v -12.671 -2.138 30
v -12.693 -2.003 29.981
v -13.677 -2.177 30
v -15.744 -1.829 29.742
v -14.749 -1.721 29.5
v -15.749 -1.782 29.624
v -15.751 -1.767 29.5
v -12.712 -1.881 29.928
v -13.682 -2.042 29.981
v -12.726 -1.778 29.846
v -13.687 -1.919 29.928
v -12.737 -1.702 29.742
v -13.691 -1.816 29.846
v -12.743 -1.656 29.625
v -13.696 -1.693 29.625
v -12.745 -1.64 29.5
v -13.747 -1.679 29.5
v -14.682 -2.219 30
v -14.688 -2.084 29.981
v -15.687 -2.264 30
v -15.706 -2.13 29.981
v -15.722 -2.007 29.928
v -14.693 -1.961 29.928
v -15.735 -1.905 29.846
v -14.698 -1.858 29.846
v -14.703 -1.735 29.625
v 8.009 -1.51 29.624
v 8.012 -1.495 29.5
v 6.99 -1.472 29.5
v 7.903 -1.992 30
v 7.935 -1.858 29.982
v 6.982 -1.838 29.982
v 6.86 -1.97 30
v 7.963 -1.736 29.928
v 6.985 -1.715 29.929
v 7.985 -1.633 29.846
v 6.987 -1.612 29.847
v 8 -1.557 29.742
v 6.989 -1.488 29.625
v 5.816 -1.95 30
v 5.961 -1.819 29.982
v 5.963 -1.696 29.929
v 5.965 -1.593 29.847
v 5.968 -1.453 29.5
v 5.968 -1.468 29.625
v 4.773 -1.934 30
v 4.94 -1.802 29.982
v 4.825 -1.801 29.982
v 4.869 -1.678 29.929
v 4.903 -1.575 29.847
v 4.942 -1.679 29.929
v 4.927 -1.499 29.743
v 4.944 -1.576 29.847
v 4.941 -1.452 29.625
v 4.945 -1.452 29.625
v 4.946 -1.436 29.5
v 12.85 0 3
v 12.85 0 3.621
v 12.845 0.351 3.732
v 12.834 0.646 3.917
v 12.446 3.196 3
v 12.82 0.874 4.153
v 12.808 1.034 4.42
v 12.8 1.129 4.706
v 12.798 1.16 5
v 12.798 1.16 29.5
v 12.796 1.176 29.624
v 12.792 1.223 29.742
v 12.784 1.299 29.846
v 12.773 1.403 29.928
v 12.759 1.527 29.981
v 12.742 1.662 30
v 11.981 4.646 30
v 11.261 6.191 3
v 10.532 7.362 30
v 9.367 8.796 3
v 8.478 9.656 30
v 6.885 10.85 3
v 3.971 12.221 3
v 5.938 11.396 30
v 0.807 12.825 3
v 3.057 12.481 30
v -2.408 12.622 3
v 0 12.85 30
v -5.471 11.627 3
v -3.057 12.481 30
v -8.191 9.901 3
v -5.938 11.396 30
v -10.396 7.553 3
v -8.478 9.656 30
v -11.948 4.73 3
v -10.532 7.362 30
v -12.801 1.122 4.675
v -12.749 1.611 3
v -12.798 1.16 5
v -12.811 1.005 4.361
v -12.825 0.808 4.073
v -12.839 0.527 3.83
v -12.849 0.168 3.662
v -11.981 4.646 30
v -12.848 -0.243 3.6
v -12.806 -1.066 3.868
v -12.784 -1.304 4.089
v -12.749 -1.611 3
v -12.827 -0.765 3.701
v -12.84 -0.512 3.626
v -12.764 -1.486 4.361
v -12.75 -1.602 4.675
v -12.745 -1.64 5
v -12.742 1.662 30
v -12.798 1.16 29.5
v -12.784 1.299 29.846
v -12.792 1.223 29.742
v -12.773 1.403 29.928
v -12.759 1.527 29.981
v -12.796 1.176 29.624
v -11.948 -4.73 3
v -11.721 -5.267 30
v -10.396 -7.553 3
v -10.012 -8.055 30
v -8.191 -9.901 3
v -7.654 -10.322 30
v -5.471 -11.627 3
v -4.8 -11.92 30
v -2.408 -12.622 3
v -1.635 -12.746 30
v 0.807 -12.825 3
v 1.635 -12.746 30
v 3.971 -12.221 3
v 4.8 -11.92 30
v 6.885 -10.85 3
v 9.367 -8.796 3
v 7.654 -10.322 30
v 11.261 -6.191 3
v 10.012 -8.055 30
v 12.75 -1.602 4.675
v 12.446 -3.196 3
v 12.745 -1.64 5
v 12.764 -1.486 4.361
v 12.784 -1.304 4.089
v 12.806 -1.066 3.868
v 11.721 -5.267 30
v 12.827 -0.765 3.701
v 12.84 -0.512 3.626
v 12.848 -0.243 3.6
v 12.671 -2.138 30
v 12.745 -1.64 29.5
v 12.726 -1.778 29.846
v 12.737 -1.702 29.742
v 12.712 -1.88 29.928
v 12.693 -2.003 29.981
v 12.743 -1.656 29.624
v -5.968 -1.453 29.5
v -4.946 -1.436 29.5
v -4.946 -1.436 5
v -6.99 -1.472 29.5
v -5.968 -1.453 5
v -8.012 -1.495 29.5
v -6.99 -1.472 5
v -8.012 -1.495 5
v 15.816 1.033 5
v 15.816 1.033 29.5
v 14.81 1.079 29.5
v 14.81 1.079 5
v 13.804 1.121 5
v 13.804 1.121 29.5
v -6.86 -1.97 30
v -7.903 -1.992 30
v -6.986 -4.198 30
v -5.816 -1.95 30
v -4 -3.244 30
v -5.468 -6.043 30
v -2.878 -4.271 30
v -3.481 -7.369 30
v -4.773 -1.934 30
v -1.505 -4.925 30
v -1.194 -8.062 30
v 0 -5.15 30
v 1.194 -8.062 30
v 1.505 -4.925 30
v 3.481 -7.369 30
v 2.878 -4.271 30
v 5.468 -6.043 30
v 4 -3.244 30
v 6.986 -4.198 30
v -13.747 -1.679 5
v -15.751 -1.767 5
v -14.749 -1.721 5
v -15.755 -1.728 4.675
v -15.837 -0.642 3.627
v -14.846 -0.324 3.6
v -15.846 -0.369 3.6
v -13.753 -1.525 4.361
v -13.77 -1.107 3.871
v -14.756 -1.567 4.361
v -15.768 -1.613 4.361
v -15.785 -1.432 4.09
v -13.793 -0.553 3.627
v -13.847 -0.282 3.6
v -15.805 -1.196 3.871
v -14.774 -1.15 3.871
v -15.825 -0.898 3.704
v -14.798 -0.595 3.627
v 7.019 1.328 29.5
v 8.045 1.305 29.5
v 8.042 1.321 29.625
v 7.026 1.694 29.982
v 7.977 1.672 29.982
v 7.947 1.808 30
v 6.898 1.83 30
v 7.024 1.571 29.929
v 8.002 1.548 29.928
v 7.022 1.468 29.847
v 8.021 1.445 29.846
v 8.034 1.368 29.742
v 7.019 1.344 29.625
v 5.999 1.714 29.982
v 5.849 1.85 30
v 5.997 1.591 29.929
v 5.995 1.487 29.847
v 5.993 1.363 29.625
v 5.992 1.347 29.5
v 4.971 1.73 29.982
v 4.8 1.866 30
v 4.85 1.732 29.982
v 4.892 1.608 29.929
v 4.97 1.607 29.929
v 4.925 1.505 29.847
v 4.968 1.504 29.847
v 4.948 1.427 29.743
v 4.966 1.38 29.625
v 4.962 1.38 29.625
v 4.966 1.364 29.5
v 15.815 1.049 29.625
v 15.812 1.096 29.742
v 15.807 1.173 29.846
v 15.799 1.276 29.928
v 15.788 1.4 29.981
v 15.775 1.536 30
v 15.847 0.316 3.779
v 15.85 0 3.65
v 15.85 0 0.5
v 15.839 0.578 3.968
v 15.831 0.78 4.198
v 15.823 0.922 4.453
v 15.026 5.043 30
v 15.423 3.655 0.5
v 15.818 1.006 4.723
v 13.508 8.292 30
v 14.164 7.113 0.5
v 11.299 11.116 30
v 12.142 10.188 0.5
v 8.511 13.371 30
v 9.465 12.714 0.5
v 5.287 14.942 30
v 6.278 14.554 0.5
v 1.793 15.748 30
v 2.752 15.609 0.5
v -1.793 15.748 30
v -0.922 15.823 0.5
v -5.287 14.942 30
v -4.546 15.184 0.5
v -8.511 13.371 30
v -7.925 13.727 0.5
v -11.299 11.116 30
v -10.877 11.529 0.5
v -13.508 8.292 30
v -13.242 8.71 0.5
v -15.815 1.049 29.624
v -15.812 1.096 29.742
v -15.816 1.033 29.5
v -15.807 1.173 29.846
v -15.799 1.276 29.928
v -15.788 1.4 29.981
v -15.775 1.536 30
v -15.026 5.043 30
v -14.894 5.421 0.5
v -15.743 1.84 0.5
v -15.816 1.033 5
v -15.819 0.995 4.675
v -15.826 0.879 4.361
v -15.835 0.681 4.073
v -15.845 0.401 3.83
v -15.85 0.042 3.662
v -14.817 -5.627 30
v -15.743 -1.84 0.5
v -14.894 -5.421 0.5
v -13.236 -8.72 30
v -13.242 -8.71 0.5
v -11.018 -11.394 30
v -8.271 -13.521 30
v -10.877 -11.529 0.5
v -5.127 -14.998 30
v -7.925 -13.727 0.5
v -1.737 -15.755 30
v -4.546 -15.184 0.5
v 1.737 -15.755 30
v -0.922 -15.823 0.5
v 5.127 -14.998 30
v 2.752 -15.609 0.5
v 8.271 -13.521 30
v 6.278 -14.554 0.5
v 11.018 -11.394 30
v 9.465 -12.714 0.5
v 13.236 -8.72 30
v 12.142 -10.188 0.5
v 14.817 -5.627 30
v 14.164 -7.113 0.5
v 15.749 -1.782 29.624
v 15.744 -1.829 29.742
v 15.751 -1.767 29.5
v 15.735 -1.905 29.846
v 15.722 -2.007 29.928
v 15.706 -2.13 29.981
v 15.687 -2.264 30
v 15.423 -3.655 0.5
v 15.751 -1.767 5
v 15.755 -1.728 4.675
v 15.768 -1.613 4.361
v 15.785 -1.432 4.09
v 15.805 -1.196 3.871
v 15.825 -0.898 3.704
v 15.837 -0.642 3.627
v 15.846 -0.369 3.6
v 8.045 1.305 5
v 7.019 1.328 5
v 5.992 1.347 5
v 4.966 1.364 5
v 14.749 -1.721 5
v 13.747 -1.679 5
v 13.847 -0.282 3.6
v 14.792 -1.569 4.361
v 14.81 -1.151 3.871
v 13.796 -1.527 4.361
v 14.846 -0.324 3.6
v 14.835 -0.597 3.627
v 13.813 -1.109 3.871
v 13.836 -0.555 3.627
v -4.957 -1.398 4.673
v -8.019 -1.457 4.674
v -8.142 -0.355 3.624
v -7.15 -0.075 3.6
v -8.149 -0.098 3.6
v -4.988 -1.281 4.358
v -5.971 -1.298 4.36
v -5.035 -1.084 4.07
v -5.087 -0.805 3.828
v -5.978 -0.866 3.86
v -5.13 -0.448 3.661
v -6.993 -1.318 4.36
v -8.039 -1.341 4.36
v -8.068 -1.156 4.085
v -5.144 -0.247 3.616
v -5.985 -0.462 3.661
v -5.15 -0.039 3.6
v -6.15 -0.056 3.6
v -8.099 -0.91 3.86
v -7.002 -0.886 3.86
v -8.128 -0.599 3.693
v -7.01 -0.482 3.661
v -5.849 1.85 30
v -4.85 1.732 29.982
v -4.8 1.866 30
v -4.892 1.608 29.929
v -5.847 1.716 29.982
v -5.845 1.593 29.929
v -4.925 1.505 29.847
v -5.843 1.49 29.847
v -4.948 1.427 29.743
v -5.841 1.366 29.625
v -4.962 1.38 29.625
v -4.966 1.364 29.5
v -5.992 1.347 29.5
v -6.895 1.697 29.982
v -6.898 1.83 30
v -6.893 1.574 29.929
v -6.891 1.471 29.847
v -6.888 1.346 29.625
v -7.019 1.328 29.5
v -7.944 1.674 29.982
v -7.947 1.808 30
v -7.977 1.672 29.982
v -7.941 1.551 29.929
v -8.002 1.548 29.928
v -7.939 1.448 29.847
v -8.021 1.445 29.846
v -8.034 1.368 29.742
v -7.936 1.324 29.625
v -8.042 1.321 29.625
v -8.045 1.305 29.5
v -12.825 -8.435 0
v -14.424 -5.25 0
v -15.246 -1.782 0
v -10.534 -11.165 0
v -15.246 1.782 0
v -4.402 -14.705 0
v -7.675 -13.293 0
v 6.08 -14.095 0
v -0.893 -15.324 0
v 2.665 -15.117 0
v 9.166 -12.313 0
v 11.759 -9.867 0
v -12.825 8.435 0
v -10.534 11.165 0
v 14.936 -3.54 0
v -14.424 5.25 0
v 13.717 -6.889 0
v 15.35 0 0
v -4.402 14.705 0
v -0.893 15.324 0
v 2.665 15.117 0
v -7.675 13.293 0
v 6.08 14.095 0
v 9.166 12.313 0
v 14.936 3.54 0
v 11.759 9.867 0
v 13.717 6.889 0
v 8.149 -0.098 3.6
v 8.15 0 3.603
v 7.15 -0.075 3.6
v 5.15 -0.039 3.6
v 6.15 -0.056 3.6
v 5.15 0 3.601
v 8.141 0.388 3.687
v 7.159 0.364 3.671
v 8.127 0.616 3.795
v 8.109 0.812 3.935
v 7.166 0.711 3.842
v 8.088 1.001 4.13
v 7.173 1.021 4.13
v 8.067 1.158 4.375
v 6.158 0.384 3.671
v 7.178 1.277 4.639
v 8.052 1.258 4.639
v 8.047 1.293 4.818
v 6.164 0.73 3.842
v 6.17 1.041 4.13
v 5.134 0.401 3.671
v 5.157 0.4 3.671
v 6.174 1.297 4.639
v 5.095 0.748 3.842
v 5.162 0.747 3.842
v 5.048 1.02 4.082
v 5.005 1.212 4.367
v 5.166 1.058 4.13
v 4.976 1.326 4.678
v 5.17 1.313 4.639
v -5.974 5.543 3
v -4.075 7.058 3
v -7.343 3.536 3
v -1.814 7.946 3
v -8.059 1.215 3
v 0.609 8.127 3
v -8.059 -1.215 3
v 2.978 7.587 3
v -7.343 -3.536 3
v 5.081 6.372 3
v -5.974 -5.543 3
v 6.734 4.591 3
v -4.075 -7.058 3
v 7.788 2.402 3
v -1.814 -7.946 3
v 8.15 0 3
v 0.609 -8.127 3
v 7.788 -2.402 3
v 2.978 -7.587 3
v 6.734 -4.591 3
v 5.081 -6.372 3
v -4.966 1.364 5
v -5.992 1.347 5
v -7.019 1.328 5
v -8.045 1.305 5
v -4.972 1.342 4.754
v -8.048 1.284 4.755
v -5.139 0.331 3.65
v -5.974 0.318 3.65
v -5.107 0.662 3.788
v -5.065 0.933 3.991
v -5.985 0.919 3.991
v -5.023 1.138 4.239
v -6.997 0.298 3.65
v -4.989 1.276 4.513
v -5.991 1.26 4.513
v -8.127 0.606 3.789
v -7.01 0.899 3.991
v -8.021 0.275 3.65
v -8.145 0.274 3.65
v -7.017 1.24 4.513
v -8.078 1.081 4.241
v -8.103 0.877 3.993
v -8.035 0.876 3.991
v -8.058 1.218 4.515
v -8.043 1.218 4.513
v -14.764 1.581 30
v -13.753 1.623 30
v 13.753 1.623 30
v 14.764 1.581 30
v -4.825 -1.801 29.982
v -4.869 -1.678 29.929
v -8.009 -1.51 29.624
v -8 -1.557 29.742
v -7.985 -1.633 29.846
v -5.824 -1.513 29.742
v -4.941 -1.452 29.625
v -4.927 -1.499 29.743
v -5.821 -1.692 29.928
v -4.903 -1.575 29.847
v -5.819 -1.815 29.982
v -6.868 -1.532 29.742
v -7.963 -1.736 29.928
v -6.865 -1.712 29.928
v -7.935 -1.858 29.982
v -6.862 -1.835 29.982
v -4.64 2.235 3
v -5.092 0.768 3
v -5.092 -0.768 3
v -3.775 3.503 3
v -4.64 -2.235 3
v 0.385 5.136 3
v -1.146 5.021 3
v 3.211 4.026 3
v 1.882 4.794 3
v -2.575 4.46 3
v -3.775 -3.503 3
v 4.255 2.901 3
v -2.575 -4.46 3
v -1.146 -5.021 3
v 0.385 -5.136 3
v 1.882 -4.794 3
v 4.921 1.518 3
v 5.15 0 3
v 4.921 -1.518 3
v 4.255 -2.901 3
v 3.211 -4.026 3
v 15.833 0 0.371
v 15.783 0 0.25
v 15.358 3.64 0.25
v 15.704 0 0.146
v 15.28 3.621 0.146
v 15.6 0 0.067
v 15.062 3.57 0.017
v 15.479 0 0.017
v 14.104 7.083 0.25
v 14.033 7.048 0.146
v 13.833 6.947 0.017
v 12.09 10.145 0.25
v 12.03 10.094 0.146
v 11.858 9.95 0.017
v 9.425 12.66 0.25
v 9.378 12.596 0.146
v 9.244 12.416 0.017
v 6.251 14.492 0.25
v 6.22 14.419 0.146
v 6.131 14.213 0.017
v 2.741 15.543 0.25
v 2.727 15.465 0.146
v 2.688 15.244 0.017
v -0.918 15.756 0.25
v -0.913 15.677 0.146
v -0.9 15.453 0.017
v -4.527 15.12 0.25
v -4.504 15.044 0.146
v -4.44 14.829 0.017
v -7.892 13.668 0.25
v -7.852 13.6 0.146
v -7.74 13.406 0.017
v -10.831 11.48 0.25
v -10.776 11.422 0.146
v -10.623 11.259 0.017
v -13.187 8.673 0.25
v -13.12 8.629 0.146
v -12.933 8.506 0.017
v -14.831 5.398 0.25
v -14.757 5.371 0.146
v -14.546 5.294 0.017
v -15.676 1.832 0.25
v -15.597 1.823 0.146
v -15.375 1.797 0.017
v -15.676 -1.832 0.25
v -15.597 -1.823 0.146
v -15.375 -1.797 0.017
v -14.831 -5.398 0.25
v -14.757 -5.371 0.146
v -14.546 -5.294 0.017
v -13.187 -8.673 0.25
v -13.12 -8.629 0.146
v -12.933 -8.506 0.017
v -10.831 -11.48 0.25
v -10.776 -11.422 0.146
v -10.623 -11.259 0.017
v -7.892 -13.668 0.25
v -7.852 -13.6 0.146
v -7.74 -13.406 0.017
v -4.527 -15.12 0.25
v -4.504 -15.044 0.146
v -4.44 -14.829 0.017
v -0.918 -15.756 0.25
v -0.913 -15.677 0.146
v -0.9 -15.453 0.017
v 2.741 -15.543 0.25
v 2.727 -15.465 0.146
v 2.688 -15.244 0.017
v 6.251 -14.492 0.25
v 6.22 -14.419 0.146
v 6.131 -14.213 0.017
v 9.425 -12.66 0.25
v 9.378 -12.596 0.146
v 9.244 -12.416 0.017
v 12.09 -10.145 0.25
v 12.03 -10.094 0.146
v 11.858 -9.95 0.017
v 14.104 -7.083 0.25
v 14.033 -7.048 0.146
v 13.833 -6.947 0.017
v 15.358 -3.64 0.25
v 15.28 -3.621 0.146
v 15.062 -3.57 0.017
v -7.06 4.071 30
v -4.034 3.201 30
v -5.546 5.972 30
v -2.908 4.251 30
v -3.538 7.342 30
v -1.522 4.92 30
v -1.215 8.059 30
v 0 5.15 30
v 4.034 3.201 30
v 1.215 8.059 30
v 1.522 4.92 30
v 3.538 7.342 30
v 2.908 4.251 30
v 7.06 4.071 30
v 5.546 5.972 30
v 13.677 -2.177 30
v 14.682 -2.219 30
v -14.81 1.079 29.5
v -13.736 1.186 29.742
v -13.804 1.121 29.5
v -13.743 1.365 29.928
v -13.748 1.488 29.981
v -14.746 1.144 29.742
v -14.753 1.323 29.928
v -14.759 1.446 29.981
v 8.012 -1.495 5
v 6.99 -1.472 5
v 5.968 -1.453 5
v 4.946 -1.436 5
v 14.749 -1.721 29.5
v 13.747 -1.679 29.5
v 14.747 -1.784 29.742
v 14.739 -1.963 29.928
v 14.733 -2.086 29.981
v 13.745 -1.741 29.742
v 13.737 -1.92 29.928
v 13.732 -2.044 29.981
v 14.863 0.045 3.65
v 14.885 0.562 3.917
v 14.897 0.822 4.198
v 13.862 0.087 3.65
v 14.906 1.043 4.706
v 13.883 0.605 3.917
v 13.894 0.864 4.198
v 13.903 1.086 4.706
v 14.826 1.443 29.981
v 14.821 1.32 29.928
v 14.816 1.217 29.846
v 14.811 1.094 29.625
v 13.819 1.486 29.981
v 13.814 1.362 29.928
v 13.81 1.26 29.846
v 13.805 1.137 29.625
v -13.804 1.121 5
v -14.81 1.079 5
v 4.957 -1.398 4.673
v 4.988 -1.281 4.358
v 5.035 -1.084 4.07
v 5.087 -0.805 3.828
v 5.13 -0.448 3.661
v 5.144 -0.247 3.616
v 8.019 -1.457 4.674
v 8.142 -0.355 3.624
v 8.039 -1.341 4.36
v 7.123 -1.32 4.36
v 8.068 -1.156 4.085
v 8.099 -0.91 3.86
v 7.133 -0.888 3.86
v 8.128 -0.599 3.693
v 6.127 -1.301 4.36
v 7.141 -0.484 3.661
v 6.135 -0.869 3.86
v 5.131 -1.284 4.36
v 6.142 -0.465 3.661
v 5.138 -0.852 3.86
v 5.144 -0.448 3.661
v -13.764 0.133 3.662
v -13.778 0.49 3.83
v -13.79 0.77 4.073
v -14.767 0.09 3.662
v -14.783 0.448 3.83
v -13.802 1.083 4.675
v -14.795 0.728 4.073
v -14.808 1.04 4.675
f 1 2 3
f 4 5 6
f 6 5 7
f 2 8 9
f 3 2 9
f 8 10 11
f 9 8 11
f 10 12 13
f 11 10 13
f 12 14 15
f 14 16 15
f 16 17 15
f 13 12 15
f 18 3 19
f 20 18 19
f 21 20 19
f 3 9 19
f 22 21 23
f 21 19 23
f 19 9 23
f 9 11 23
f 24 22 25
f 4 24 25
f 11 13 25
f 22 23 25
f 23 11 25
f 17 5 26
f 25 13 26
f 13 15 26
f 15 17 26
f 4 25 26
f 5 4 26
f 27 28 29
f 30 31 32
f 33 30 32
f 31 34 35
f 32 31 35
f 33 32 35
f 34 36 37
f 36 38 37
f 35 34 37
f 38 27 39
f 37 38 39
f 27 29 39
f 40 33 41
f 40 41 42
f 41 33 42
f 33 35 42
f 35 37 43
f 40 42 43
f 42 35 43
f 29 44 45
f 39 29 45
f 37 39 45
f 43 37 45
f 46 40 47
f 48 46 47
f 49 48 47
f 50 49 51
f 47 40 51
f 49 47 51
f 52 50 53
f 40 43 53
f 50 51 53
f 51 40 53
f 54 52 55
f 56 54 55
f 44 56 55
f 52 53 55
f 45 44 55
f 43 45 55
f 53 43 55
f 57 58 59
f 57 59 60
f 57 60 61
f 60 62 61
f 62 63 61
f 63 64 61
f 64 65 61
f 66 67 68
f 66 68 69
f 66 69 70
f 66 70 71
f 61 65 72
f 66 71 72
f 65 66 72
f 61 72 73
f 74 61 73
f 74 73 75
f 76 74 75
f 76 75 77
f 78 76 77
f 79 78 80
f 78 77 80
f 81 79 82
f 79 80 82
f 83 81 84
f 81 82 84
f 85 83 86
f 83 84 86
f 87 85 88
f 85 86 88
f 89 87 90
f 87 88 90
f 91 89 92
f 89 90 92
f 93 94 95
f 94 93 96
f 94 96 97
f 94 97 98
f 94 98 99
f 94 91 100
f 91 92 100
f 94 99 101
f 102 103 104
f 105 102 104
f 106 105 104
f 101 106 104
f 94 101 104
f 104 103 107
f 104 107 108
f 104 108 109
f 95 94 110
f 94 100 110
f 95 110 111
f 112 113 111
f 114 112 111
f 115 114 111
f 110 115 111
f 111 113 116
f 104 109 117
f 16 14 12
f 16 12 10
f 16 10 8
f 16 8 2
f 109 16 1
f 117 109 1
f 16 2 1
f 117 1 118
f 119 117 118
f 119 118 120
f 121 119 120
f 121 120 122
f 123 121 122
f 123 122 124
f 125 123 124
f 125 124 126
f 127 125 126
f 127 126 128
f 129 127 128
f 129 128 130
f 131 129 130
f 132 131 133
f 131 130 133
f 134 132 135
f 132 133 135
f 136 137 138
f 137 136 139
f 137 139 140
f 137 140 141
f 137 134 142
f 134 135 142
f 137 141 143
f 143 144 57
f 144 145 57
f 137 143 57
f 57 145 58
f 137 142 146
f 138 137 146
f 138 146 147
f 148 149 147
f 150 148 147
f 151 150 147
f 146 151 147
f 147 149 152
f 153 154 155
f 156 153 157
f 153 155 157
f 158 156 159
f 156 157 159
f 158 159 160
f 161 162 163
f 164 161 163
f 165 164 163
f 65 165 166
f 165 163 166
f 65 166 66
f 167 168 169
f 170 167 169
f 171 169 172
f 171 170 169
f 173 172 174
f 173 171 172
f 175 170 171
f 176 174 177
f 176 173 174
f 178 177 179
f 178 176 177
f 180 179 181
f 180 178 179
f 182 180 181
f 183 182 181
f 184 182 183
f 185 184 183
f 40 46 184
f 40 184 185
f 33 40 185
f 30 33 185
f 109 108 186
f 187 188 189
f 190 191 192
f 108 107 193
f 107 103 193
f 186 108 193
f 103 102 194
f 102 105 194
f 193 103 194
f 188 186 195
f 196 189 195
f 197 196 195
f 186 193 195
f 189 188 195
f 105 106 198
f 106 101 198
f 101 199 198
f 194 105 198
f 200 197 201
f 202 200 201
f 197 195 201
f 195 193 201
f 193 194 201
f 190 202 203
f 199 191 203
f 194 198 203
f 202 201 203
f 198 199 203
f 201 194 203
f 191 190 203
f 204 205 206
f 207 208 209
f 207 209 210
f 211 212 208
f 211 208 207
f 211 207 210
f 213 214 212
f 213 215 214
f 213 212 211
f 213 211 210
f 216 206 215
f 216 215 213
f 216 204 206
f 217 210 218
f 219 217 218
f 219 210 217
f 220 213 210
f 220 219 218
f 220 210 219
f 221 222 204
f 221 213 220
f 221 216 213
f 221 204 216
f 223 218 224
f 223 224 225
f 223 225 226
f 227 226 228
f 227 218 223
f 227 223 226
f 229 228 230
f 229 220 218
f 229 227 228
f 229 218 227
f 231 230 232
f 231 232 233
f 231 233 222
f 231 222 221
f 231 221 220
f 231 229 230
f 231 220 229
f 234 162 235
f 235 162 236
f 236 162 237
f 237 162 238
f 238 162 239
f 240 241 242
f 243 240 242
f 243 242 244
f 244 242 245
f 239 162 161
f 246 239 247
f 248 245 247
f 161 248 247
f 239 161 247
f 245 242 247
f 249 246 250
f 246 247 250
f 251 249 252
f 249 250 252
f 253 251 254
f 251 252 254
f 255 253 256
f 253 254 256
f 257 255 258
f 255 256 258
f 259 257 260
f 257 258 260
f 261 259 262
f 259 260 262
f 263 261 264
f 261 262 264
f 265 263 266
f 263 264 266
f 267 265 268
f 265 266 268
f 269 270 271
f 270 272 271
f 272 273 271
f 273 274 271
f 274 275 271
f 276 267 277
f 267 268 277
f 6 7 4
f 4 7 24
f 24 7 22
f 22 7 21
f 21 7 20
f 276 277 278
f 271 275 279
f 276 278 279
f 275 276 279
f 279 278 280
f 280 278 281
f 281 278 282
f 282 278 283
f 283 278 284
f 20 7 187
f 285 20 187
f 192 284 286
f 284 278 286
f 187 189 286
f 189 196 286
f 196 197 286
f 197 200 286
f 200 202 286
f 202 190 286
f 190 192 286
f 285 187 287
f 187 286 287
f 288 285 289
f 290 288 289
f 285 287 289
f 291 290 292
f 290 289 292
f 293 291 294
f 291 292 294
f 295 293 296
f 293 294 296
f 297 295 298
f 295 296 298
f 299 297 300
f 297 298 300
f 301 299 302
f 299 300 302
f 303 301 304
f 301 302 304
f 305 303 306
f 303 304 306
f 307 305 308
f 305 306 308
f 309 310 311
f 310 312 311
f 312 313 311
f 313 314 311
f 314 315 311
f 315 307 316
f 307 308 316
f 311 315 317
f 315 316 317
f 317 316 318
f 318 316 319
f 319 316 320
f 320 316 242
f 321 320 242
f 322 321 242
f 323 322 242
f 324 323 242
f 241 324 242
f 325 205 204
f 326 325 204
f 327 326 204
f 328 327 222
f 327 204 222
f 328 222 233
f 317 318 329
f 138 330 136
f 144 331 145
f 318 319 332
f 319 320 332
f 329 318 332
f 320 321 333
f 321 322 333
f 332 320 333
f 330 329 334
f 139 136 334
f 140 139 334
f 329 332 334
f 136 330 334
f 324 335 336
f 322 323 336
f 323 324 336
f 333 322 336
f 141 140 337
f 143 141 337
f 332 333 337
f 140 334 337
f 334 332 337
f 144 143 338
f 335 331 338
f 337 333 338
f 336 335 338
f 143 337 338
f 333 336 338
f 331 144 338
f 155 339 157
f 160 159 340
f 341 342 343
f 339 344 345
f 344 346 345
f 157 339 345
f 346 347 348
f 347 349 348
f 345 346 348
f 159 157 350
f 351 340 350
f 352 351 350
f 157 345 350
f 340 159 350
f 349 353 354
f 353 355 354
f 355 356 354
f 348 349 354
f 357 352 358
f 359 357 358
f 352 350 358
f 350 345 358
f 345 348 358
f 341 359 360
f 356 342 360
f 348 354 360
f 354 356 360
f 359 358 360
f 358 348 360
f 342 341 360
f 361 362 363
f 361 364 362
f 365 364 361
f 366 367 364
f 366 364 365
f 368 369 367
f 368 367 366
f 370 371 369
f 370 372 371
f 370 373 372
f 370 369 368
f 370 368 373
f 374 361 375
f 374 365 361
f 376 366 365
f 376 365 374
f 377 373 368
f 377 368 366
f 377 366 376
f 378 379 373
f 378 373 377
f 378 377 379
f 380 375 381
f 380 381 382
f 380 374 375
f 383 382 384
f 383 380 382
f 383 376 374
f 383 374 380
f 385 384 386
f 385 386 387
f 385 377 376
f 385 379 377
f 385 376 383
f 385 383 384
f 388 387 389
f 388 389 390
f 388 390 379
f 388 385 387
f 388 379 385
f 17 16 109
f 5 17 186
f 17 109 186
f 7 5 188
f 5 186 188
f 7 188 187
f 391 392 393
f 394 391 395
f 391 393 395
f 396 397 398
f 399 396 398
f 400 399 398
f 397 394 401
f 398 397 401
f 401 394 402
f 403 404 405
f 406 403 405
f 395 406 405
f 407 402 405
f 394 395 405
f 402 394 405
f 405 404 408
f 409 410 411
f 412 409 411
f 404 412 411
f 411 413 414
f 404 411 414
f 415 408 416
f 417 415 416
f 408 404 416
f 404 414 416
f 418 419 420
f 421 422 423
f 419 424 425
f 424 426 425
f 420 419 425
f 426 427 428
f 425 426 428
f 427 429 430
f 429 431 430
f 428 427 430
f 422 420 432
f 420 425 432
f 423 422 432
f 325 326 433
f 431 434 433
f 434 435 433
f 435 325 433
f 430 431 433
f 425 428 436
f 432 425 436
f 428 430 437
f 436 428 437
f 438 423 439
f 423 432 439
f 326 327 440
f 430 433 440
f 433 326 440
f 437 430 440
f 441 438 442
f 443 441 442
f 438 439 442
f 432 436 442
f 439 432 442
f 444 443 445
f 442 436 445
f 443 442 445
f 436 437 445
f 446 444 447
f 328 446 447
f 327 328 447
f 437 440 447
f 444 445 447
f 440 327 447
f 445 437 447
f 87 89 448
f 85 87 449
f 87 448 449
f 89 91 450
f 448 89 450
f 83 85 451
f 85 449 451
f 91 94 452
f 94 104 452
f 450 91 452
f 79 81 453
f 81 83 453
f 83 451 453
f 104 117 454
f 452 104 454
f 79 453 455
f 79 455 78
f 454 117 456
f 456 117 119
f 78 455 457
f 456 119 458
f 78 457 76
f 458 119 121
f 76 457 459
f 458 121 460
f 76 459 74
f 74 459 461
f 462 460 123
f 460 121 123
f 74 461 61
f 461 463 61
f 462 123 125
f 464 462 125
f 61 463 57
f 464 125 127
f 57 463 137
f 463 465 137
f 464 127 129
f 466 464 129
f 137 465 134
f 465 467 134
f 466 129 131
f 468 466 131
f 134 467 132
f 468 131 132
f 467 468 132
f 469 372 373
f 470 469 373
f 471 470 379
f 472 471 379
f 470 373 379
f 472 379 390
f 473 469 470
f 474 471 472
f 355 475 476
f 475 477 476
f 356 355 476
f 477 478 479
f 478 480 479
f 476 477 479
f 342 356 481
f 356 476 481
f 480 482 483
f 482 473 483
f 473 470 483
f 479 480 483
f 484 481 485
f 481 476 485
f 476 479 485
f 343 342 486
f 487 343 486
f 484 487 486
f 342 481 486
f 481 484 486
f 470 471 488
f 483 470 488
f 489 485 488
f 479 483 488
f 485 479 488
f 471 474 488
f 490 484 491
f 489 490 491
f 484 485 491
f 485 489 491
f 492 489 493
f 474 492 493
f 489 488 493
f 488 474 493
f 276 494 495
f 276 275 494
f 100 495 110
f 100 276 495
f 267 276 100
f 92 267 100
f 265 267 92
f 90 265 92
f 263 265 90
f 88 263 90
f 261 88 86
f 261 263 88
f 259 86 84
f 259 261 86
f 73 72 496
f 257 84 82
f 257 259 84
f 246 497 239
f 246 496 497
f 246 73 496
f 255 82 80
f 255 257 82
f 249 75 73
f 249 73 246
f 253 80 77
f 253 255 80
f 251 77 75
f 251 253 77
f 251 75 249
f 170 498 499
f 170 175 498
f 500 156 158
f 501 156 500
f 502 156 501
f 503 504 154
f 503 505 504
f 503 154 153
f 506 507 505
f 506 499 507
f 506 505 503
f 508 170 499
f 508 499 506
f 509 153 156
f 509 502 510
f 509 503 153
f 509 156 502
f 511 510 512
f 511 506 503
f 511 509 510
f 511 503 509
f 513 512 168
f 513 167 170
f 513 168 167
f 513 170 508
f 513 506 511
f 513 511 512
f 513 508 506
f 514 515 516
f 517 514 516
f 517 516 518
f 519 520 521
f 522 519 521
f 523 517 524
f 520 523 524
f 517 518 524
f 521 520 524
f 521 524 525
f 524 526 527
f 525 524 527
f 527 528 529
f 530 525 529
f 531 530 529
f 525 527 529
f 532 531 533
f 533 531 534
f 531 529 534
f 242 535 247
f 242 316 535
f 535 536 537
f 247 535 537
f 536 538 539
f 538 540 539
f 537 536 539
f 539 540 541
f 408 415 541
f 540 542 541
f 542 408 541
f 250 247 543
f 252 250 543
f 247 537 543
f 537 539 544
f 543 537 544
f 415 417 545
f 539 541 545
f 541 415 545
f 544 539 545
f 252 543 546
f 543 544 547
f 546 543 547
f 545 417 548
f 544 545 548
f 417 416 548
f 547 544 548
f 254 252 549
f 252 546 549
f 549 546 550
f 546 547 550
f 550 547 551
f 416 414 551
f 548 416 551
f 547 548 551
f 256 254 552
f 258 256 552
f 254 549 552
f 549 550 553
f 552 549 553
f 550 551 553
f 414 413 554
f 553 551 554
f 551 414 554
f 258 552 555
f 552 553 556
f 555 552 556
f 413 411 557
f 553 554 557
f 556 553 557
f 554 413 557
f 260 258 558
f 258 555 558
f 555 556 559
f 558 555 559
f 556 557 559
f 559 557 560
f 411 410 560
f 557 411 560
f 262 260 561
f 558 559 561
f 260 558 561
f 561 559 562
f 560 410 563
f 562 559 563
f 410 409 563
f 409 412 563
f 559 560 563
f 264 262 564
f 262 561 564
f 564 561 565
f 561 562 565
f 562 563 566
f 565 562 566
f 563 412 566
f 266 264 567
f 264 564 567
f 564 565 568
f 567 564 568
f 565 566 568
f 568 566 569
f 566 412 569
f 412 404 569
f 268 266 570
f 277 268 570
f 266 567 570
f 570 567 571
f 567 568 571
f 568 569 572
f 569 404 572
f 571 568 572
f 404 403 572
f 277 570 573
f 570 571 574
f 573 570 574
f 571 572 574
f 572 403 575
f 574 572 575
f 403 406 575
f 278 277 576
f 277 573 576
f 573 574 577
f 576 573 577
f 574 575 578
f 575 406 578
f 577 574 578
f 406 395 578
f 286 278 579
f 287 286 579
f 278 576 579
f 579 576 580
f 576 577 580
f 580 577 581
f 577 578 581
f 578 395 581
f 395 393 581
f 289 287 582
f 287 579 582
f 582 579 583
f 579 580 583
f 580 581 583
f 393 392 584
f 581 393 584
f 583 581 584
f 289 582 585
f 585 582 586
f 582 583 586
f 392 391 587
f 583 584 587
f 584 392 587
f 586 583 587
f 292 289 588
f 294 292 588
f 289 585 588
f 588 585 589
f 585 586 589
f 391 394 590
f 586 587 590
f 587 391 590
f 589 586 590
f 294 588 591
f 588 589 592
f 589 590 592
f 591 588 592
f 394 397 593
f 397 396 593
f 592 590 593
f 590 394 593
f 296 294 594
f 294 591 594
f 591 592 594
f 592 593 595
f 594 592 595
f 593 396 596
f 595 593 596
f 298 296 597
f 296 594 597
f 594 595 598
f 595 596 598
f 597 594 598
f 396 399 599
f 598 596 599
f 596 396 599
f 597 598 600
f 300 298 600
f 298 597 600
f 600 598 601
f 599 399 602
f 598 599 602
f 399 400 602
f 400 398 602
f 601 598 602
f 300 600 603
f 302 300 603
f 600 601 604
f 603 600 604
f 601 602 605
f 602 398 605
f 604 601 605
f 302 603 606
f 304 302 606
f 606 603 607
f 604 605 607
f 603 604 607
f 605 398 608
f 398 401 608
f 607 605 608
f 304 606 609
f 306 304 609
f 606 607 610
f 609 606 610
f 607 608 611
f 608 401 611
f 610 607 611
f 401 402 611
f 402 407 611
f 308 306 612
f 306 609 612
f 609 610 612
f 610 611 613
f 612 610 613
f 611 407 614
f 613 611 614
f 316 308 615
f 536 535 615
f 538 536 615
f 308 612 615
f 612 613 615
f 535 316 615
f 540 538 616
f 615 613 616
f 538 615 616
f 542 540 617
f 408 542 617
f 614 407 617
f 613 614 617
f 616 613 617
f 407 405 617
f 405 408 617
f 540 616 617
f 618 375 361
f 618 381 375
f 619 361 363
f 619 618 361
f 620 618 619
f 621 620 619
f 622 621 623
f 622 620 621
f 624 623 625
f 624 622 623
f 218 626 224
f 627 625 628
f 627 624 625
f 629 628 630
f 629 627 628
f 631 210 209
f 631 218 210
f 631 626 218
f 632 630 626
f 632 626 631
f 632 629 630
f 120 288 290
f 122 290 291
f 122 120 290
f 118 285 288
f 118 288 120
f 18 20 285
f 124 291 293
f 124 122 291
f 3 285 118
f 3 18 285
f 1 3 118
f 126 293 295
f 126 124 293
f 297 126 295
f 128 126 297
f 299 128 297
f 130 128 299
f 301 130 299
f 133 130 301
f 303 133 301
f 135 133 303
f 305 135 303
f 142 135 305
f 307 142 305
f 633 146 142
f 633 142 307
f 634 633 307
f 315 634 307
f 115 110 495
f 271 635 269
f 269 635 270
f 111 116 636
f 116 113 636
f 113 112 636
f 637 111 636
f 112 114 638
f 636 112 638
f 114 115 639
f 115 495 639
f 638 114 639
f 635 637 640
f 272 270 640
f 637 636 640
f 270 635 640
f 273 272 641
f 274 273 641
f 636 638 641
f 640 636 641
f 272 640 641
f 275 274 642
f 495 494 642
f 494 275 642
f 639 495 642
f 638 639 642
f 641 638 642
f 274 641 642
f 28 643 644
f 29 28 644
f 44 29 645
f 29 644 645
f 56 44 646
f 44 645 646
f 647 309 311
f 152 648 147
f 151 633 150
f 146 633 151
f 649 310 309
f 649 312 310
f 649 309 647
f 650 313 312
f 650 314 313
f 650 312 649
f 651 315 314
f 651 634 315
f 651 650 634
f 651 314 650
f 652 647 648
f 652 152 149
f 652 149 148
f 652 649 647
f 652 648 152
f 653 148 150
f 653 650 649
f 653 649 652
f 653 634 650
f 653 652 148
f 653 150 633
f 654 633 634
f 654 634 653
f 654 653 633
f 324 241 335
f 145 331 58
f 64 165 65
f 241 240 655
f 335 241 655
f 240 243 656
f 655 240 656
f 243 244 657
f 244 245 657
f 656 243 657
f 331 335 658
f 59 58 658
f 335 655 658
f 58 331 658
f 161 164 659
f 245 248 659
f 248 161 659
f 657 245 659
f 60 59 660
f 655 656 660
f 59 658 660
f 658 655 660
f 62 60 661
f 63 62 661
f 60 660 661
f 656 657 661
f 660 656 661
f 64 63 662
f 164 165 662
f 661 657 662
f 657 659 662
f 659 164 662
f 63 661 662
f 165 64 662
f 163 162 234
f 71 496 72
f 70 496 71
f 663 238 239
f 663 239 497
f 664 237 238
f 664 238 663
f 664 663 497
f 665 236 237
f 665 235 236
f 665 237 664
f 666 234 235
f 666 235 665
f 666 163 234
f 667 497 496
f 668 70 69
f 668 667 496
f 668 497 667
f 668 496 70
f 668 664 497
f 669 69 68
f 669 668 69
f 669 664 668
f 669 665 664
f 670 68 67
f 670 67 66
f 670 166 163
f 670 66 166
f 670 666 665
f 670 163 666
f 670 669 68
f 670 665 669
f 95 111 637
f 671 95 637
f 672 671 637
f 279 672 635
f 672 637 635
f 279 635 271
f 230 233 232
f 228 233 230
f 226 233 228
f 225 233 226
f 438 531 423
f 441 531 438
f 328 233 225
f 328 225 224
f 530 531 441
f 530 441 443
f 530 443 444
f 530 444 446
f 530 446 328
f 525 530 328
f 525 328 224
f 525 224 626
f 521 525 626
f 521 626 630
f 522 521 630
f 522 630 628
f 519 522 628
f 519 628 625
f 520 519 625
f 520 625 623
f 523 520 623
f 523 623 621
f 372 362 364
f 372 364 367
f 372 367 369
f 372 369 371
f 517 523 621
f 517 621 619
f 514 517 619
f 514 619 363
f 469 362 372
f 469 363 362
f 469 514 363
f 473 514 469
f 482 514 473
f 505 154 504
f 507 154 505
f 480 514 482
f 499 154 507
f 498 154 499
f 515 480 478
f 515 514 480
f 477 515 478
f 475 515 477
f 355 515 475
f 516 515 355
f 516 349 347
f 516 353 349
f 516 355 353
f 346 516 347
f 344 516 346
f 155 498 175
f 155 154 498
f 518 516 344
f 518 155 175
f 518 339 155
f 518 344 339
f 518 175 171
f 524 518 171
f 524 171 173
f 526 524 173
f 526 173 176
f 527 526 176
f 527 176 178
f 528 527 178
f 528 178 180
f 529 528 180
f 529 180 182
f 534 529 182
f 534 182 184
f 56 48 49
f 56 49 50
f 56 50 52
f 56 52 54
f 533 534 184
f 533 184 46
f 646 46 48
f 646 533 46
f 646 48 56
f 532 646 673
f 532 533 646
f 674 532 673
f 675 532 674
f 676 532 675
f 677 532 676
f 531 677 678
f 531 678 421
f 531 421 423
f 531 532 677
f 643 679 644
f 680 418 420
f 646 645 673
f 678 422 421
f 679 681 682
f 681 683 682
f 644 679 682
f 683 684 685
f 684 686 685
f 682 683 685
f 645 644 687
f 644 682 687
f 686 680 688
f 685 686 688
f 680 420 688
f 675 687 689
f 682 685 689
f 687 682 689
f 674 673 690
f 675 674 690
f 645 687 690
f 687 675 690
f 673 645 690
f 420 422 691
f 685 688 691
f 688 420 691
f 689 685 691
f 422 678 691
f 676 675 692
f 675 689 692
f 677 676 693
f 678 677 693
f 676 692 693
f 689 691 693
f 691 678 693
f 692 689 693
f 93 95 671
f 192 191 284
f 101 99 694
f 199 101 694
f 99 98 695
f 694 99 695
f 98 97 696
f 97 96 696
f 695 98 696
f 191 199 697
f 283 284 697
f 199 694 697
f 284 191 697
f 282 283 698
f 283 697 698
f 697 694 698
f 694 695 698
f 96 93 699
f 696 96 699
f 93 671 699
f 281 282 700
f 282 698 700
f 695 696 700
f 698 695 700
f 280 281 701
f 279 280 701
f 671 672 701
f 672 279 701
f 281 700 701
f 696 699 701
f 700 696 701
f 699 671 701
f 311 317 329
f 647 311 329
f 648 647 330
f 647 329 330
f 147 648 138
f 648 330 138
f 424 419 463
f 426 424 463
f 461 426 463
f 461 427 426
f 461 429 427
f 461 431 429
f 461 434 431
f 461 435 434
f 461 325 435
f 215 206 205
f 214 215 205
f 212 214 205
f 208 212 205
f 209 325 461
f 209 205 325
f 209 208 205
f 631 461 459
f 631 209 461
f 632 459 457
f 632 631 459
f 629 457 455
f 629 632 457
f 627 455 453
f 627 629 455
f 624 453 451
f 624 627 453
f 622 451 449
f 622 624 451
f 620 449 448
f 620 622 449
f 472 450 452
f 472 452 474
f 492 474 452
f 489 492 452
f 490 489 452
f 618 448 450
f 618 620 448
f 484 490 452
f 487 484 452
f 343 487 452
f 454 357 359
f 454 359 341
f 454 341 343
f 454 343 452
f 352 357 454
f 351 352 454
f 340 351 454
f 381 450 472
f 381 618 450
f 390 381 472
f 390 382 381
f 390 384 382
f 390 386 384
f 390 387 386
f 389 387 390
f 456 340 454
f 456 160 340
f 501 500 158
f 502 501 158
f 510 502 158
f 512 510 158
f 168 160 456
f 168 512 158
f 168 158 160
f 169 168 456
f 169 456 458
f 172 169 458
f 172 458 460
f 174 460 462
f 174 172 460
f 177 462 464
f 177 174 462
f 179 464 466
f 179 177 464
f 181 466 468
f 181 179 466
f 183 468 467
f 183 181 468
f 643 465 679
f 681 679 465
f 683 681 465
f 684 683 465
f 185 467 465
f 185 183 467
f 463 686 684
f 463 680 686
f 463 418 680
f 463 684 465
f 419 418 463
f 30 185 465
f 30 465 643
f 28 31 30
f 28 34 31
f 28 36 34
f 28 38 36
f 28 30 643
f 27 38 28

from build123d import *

# Parameters (mm, degrees)
F0_R      = 15.85
F0_R_2    = 5.15
F1_DEPTH  = 30
F2_R      = 12.85
F2_R_2    = 8.15
F3_DEPTH  = 40
F4_R      = 12.65
F4_R_2    = 8.9
F5_DEPTH  = 40
F10_R     = 0.5
F11_R     = 15.35
F12_DEPTH = 3


# Not quite as in the source:
# - a feature names something its author has since deleted; it is built from what else it names


with BuildPart() as f1:
    # F0 (on Top) → F1 (new body)
    with BuildSketch(Plane.XY):
        Circle(F0_R)
        Circle(F0_R_2, mode=Mode.SUBTRACT)
    extrude(amount=F1_DEPTH)

    # F2 (on face) → F3 (cut)
    with BuildSketch(Plane.XY.offset(30)):
        Circle(F2_R)
        Circle(F2_R_2, mode=Mode.SUBTRACT)
    extrude(amount=-F3_DEPTH, mode=Mode.SUBTRACT)

    # F4 (on face) → F5 (cut)
    with BuildSketch(Plane(origin=(0, 0, 0), x_dir=(1, 0, 0), z_dir=(0, 0, -1))):
        Circle(F4_R)
        Circle(F4_R_2, mode=Mode.SUBTRACT)
    extrude(amount=-F5_DEPTH, mode=Mode.SUBTRACT)

    # F7 (on Right) → F9 (revolve, cut)
    with BuildSketch(Plane.YZ):
        with BuildLine():
            Line((1.4, 5), (1.4, 30))
            Line((1.4, 30), (0, 30))
            Line((0, 30), (-1.4, 30))
            Line((-1.4, 30), (-1.4, 5))
            ThreePointArc((-1.4, 5), (-0.9899494937, 4.0100505063), (0, 3.6))
            ThreePointArc((0, 3.6), (0.9899494937, 4.0100505063), (1.4, 5))
        make_face()
    revolve(axis=Axis((0, -340, 29.7196172178), (0, 0, 1)), mode=Mode.SUBTRACT)

    # F10
    f10_edges = [f1.edges().sort_by_distance(p)[0] for p in [
        (-14.307042, 1.100086, 30),
        (14.307042, 1.100086, 30),
        (6.50553, 1.338011, 30),
        (-6.50553, 1.338011, 30),
        (14.248226, -1.699914, 30),
        (-14.248226, -1.699914, 30),
        (-6.478795, -1.461989, 30),
        (6.478795, -1.461989, 30),
        (-15.85, 0, 0),
    ]]
    fillet(f10_edges, radius=F10_R)

    # F11 (on face) → F12 (join)
    with BuildSketch(Plane(origin=(0, 0, 0), x_dir=(1, 0, 0), z_dir=(0, 0, -1))):
        Circle(F11_R)
    extrude(amount=-F12_DEPTH)


solid = f1.part
